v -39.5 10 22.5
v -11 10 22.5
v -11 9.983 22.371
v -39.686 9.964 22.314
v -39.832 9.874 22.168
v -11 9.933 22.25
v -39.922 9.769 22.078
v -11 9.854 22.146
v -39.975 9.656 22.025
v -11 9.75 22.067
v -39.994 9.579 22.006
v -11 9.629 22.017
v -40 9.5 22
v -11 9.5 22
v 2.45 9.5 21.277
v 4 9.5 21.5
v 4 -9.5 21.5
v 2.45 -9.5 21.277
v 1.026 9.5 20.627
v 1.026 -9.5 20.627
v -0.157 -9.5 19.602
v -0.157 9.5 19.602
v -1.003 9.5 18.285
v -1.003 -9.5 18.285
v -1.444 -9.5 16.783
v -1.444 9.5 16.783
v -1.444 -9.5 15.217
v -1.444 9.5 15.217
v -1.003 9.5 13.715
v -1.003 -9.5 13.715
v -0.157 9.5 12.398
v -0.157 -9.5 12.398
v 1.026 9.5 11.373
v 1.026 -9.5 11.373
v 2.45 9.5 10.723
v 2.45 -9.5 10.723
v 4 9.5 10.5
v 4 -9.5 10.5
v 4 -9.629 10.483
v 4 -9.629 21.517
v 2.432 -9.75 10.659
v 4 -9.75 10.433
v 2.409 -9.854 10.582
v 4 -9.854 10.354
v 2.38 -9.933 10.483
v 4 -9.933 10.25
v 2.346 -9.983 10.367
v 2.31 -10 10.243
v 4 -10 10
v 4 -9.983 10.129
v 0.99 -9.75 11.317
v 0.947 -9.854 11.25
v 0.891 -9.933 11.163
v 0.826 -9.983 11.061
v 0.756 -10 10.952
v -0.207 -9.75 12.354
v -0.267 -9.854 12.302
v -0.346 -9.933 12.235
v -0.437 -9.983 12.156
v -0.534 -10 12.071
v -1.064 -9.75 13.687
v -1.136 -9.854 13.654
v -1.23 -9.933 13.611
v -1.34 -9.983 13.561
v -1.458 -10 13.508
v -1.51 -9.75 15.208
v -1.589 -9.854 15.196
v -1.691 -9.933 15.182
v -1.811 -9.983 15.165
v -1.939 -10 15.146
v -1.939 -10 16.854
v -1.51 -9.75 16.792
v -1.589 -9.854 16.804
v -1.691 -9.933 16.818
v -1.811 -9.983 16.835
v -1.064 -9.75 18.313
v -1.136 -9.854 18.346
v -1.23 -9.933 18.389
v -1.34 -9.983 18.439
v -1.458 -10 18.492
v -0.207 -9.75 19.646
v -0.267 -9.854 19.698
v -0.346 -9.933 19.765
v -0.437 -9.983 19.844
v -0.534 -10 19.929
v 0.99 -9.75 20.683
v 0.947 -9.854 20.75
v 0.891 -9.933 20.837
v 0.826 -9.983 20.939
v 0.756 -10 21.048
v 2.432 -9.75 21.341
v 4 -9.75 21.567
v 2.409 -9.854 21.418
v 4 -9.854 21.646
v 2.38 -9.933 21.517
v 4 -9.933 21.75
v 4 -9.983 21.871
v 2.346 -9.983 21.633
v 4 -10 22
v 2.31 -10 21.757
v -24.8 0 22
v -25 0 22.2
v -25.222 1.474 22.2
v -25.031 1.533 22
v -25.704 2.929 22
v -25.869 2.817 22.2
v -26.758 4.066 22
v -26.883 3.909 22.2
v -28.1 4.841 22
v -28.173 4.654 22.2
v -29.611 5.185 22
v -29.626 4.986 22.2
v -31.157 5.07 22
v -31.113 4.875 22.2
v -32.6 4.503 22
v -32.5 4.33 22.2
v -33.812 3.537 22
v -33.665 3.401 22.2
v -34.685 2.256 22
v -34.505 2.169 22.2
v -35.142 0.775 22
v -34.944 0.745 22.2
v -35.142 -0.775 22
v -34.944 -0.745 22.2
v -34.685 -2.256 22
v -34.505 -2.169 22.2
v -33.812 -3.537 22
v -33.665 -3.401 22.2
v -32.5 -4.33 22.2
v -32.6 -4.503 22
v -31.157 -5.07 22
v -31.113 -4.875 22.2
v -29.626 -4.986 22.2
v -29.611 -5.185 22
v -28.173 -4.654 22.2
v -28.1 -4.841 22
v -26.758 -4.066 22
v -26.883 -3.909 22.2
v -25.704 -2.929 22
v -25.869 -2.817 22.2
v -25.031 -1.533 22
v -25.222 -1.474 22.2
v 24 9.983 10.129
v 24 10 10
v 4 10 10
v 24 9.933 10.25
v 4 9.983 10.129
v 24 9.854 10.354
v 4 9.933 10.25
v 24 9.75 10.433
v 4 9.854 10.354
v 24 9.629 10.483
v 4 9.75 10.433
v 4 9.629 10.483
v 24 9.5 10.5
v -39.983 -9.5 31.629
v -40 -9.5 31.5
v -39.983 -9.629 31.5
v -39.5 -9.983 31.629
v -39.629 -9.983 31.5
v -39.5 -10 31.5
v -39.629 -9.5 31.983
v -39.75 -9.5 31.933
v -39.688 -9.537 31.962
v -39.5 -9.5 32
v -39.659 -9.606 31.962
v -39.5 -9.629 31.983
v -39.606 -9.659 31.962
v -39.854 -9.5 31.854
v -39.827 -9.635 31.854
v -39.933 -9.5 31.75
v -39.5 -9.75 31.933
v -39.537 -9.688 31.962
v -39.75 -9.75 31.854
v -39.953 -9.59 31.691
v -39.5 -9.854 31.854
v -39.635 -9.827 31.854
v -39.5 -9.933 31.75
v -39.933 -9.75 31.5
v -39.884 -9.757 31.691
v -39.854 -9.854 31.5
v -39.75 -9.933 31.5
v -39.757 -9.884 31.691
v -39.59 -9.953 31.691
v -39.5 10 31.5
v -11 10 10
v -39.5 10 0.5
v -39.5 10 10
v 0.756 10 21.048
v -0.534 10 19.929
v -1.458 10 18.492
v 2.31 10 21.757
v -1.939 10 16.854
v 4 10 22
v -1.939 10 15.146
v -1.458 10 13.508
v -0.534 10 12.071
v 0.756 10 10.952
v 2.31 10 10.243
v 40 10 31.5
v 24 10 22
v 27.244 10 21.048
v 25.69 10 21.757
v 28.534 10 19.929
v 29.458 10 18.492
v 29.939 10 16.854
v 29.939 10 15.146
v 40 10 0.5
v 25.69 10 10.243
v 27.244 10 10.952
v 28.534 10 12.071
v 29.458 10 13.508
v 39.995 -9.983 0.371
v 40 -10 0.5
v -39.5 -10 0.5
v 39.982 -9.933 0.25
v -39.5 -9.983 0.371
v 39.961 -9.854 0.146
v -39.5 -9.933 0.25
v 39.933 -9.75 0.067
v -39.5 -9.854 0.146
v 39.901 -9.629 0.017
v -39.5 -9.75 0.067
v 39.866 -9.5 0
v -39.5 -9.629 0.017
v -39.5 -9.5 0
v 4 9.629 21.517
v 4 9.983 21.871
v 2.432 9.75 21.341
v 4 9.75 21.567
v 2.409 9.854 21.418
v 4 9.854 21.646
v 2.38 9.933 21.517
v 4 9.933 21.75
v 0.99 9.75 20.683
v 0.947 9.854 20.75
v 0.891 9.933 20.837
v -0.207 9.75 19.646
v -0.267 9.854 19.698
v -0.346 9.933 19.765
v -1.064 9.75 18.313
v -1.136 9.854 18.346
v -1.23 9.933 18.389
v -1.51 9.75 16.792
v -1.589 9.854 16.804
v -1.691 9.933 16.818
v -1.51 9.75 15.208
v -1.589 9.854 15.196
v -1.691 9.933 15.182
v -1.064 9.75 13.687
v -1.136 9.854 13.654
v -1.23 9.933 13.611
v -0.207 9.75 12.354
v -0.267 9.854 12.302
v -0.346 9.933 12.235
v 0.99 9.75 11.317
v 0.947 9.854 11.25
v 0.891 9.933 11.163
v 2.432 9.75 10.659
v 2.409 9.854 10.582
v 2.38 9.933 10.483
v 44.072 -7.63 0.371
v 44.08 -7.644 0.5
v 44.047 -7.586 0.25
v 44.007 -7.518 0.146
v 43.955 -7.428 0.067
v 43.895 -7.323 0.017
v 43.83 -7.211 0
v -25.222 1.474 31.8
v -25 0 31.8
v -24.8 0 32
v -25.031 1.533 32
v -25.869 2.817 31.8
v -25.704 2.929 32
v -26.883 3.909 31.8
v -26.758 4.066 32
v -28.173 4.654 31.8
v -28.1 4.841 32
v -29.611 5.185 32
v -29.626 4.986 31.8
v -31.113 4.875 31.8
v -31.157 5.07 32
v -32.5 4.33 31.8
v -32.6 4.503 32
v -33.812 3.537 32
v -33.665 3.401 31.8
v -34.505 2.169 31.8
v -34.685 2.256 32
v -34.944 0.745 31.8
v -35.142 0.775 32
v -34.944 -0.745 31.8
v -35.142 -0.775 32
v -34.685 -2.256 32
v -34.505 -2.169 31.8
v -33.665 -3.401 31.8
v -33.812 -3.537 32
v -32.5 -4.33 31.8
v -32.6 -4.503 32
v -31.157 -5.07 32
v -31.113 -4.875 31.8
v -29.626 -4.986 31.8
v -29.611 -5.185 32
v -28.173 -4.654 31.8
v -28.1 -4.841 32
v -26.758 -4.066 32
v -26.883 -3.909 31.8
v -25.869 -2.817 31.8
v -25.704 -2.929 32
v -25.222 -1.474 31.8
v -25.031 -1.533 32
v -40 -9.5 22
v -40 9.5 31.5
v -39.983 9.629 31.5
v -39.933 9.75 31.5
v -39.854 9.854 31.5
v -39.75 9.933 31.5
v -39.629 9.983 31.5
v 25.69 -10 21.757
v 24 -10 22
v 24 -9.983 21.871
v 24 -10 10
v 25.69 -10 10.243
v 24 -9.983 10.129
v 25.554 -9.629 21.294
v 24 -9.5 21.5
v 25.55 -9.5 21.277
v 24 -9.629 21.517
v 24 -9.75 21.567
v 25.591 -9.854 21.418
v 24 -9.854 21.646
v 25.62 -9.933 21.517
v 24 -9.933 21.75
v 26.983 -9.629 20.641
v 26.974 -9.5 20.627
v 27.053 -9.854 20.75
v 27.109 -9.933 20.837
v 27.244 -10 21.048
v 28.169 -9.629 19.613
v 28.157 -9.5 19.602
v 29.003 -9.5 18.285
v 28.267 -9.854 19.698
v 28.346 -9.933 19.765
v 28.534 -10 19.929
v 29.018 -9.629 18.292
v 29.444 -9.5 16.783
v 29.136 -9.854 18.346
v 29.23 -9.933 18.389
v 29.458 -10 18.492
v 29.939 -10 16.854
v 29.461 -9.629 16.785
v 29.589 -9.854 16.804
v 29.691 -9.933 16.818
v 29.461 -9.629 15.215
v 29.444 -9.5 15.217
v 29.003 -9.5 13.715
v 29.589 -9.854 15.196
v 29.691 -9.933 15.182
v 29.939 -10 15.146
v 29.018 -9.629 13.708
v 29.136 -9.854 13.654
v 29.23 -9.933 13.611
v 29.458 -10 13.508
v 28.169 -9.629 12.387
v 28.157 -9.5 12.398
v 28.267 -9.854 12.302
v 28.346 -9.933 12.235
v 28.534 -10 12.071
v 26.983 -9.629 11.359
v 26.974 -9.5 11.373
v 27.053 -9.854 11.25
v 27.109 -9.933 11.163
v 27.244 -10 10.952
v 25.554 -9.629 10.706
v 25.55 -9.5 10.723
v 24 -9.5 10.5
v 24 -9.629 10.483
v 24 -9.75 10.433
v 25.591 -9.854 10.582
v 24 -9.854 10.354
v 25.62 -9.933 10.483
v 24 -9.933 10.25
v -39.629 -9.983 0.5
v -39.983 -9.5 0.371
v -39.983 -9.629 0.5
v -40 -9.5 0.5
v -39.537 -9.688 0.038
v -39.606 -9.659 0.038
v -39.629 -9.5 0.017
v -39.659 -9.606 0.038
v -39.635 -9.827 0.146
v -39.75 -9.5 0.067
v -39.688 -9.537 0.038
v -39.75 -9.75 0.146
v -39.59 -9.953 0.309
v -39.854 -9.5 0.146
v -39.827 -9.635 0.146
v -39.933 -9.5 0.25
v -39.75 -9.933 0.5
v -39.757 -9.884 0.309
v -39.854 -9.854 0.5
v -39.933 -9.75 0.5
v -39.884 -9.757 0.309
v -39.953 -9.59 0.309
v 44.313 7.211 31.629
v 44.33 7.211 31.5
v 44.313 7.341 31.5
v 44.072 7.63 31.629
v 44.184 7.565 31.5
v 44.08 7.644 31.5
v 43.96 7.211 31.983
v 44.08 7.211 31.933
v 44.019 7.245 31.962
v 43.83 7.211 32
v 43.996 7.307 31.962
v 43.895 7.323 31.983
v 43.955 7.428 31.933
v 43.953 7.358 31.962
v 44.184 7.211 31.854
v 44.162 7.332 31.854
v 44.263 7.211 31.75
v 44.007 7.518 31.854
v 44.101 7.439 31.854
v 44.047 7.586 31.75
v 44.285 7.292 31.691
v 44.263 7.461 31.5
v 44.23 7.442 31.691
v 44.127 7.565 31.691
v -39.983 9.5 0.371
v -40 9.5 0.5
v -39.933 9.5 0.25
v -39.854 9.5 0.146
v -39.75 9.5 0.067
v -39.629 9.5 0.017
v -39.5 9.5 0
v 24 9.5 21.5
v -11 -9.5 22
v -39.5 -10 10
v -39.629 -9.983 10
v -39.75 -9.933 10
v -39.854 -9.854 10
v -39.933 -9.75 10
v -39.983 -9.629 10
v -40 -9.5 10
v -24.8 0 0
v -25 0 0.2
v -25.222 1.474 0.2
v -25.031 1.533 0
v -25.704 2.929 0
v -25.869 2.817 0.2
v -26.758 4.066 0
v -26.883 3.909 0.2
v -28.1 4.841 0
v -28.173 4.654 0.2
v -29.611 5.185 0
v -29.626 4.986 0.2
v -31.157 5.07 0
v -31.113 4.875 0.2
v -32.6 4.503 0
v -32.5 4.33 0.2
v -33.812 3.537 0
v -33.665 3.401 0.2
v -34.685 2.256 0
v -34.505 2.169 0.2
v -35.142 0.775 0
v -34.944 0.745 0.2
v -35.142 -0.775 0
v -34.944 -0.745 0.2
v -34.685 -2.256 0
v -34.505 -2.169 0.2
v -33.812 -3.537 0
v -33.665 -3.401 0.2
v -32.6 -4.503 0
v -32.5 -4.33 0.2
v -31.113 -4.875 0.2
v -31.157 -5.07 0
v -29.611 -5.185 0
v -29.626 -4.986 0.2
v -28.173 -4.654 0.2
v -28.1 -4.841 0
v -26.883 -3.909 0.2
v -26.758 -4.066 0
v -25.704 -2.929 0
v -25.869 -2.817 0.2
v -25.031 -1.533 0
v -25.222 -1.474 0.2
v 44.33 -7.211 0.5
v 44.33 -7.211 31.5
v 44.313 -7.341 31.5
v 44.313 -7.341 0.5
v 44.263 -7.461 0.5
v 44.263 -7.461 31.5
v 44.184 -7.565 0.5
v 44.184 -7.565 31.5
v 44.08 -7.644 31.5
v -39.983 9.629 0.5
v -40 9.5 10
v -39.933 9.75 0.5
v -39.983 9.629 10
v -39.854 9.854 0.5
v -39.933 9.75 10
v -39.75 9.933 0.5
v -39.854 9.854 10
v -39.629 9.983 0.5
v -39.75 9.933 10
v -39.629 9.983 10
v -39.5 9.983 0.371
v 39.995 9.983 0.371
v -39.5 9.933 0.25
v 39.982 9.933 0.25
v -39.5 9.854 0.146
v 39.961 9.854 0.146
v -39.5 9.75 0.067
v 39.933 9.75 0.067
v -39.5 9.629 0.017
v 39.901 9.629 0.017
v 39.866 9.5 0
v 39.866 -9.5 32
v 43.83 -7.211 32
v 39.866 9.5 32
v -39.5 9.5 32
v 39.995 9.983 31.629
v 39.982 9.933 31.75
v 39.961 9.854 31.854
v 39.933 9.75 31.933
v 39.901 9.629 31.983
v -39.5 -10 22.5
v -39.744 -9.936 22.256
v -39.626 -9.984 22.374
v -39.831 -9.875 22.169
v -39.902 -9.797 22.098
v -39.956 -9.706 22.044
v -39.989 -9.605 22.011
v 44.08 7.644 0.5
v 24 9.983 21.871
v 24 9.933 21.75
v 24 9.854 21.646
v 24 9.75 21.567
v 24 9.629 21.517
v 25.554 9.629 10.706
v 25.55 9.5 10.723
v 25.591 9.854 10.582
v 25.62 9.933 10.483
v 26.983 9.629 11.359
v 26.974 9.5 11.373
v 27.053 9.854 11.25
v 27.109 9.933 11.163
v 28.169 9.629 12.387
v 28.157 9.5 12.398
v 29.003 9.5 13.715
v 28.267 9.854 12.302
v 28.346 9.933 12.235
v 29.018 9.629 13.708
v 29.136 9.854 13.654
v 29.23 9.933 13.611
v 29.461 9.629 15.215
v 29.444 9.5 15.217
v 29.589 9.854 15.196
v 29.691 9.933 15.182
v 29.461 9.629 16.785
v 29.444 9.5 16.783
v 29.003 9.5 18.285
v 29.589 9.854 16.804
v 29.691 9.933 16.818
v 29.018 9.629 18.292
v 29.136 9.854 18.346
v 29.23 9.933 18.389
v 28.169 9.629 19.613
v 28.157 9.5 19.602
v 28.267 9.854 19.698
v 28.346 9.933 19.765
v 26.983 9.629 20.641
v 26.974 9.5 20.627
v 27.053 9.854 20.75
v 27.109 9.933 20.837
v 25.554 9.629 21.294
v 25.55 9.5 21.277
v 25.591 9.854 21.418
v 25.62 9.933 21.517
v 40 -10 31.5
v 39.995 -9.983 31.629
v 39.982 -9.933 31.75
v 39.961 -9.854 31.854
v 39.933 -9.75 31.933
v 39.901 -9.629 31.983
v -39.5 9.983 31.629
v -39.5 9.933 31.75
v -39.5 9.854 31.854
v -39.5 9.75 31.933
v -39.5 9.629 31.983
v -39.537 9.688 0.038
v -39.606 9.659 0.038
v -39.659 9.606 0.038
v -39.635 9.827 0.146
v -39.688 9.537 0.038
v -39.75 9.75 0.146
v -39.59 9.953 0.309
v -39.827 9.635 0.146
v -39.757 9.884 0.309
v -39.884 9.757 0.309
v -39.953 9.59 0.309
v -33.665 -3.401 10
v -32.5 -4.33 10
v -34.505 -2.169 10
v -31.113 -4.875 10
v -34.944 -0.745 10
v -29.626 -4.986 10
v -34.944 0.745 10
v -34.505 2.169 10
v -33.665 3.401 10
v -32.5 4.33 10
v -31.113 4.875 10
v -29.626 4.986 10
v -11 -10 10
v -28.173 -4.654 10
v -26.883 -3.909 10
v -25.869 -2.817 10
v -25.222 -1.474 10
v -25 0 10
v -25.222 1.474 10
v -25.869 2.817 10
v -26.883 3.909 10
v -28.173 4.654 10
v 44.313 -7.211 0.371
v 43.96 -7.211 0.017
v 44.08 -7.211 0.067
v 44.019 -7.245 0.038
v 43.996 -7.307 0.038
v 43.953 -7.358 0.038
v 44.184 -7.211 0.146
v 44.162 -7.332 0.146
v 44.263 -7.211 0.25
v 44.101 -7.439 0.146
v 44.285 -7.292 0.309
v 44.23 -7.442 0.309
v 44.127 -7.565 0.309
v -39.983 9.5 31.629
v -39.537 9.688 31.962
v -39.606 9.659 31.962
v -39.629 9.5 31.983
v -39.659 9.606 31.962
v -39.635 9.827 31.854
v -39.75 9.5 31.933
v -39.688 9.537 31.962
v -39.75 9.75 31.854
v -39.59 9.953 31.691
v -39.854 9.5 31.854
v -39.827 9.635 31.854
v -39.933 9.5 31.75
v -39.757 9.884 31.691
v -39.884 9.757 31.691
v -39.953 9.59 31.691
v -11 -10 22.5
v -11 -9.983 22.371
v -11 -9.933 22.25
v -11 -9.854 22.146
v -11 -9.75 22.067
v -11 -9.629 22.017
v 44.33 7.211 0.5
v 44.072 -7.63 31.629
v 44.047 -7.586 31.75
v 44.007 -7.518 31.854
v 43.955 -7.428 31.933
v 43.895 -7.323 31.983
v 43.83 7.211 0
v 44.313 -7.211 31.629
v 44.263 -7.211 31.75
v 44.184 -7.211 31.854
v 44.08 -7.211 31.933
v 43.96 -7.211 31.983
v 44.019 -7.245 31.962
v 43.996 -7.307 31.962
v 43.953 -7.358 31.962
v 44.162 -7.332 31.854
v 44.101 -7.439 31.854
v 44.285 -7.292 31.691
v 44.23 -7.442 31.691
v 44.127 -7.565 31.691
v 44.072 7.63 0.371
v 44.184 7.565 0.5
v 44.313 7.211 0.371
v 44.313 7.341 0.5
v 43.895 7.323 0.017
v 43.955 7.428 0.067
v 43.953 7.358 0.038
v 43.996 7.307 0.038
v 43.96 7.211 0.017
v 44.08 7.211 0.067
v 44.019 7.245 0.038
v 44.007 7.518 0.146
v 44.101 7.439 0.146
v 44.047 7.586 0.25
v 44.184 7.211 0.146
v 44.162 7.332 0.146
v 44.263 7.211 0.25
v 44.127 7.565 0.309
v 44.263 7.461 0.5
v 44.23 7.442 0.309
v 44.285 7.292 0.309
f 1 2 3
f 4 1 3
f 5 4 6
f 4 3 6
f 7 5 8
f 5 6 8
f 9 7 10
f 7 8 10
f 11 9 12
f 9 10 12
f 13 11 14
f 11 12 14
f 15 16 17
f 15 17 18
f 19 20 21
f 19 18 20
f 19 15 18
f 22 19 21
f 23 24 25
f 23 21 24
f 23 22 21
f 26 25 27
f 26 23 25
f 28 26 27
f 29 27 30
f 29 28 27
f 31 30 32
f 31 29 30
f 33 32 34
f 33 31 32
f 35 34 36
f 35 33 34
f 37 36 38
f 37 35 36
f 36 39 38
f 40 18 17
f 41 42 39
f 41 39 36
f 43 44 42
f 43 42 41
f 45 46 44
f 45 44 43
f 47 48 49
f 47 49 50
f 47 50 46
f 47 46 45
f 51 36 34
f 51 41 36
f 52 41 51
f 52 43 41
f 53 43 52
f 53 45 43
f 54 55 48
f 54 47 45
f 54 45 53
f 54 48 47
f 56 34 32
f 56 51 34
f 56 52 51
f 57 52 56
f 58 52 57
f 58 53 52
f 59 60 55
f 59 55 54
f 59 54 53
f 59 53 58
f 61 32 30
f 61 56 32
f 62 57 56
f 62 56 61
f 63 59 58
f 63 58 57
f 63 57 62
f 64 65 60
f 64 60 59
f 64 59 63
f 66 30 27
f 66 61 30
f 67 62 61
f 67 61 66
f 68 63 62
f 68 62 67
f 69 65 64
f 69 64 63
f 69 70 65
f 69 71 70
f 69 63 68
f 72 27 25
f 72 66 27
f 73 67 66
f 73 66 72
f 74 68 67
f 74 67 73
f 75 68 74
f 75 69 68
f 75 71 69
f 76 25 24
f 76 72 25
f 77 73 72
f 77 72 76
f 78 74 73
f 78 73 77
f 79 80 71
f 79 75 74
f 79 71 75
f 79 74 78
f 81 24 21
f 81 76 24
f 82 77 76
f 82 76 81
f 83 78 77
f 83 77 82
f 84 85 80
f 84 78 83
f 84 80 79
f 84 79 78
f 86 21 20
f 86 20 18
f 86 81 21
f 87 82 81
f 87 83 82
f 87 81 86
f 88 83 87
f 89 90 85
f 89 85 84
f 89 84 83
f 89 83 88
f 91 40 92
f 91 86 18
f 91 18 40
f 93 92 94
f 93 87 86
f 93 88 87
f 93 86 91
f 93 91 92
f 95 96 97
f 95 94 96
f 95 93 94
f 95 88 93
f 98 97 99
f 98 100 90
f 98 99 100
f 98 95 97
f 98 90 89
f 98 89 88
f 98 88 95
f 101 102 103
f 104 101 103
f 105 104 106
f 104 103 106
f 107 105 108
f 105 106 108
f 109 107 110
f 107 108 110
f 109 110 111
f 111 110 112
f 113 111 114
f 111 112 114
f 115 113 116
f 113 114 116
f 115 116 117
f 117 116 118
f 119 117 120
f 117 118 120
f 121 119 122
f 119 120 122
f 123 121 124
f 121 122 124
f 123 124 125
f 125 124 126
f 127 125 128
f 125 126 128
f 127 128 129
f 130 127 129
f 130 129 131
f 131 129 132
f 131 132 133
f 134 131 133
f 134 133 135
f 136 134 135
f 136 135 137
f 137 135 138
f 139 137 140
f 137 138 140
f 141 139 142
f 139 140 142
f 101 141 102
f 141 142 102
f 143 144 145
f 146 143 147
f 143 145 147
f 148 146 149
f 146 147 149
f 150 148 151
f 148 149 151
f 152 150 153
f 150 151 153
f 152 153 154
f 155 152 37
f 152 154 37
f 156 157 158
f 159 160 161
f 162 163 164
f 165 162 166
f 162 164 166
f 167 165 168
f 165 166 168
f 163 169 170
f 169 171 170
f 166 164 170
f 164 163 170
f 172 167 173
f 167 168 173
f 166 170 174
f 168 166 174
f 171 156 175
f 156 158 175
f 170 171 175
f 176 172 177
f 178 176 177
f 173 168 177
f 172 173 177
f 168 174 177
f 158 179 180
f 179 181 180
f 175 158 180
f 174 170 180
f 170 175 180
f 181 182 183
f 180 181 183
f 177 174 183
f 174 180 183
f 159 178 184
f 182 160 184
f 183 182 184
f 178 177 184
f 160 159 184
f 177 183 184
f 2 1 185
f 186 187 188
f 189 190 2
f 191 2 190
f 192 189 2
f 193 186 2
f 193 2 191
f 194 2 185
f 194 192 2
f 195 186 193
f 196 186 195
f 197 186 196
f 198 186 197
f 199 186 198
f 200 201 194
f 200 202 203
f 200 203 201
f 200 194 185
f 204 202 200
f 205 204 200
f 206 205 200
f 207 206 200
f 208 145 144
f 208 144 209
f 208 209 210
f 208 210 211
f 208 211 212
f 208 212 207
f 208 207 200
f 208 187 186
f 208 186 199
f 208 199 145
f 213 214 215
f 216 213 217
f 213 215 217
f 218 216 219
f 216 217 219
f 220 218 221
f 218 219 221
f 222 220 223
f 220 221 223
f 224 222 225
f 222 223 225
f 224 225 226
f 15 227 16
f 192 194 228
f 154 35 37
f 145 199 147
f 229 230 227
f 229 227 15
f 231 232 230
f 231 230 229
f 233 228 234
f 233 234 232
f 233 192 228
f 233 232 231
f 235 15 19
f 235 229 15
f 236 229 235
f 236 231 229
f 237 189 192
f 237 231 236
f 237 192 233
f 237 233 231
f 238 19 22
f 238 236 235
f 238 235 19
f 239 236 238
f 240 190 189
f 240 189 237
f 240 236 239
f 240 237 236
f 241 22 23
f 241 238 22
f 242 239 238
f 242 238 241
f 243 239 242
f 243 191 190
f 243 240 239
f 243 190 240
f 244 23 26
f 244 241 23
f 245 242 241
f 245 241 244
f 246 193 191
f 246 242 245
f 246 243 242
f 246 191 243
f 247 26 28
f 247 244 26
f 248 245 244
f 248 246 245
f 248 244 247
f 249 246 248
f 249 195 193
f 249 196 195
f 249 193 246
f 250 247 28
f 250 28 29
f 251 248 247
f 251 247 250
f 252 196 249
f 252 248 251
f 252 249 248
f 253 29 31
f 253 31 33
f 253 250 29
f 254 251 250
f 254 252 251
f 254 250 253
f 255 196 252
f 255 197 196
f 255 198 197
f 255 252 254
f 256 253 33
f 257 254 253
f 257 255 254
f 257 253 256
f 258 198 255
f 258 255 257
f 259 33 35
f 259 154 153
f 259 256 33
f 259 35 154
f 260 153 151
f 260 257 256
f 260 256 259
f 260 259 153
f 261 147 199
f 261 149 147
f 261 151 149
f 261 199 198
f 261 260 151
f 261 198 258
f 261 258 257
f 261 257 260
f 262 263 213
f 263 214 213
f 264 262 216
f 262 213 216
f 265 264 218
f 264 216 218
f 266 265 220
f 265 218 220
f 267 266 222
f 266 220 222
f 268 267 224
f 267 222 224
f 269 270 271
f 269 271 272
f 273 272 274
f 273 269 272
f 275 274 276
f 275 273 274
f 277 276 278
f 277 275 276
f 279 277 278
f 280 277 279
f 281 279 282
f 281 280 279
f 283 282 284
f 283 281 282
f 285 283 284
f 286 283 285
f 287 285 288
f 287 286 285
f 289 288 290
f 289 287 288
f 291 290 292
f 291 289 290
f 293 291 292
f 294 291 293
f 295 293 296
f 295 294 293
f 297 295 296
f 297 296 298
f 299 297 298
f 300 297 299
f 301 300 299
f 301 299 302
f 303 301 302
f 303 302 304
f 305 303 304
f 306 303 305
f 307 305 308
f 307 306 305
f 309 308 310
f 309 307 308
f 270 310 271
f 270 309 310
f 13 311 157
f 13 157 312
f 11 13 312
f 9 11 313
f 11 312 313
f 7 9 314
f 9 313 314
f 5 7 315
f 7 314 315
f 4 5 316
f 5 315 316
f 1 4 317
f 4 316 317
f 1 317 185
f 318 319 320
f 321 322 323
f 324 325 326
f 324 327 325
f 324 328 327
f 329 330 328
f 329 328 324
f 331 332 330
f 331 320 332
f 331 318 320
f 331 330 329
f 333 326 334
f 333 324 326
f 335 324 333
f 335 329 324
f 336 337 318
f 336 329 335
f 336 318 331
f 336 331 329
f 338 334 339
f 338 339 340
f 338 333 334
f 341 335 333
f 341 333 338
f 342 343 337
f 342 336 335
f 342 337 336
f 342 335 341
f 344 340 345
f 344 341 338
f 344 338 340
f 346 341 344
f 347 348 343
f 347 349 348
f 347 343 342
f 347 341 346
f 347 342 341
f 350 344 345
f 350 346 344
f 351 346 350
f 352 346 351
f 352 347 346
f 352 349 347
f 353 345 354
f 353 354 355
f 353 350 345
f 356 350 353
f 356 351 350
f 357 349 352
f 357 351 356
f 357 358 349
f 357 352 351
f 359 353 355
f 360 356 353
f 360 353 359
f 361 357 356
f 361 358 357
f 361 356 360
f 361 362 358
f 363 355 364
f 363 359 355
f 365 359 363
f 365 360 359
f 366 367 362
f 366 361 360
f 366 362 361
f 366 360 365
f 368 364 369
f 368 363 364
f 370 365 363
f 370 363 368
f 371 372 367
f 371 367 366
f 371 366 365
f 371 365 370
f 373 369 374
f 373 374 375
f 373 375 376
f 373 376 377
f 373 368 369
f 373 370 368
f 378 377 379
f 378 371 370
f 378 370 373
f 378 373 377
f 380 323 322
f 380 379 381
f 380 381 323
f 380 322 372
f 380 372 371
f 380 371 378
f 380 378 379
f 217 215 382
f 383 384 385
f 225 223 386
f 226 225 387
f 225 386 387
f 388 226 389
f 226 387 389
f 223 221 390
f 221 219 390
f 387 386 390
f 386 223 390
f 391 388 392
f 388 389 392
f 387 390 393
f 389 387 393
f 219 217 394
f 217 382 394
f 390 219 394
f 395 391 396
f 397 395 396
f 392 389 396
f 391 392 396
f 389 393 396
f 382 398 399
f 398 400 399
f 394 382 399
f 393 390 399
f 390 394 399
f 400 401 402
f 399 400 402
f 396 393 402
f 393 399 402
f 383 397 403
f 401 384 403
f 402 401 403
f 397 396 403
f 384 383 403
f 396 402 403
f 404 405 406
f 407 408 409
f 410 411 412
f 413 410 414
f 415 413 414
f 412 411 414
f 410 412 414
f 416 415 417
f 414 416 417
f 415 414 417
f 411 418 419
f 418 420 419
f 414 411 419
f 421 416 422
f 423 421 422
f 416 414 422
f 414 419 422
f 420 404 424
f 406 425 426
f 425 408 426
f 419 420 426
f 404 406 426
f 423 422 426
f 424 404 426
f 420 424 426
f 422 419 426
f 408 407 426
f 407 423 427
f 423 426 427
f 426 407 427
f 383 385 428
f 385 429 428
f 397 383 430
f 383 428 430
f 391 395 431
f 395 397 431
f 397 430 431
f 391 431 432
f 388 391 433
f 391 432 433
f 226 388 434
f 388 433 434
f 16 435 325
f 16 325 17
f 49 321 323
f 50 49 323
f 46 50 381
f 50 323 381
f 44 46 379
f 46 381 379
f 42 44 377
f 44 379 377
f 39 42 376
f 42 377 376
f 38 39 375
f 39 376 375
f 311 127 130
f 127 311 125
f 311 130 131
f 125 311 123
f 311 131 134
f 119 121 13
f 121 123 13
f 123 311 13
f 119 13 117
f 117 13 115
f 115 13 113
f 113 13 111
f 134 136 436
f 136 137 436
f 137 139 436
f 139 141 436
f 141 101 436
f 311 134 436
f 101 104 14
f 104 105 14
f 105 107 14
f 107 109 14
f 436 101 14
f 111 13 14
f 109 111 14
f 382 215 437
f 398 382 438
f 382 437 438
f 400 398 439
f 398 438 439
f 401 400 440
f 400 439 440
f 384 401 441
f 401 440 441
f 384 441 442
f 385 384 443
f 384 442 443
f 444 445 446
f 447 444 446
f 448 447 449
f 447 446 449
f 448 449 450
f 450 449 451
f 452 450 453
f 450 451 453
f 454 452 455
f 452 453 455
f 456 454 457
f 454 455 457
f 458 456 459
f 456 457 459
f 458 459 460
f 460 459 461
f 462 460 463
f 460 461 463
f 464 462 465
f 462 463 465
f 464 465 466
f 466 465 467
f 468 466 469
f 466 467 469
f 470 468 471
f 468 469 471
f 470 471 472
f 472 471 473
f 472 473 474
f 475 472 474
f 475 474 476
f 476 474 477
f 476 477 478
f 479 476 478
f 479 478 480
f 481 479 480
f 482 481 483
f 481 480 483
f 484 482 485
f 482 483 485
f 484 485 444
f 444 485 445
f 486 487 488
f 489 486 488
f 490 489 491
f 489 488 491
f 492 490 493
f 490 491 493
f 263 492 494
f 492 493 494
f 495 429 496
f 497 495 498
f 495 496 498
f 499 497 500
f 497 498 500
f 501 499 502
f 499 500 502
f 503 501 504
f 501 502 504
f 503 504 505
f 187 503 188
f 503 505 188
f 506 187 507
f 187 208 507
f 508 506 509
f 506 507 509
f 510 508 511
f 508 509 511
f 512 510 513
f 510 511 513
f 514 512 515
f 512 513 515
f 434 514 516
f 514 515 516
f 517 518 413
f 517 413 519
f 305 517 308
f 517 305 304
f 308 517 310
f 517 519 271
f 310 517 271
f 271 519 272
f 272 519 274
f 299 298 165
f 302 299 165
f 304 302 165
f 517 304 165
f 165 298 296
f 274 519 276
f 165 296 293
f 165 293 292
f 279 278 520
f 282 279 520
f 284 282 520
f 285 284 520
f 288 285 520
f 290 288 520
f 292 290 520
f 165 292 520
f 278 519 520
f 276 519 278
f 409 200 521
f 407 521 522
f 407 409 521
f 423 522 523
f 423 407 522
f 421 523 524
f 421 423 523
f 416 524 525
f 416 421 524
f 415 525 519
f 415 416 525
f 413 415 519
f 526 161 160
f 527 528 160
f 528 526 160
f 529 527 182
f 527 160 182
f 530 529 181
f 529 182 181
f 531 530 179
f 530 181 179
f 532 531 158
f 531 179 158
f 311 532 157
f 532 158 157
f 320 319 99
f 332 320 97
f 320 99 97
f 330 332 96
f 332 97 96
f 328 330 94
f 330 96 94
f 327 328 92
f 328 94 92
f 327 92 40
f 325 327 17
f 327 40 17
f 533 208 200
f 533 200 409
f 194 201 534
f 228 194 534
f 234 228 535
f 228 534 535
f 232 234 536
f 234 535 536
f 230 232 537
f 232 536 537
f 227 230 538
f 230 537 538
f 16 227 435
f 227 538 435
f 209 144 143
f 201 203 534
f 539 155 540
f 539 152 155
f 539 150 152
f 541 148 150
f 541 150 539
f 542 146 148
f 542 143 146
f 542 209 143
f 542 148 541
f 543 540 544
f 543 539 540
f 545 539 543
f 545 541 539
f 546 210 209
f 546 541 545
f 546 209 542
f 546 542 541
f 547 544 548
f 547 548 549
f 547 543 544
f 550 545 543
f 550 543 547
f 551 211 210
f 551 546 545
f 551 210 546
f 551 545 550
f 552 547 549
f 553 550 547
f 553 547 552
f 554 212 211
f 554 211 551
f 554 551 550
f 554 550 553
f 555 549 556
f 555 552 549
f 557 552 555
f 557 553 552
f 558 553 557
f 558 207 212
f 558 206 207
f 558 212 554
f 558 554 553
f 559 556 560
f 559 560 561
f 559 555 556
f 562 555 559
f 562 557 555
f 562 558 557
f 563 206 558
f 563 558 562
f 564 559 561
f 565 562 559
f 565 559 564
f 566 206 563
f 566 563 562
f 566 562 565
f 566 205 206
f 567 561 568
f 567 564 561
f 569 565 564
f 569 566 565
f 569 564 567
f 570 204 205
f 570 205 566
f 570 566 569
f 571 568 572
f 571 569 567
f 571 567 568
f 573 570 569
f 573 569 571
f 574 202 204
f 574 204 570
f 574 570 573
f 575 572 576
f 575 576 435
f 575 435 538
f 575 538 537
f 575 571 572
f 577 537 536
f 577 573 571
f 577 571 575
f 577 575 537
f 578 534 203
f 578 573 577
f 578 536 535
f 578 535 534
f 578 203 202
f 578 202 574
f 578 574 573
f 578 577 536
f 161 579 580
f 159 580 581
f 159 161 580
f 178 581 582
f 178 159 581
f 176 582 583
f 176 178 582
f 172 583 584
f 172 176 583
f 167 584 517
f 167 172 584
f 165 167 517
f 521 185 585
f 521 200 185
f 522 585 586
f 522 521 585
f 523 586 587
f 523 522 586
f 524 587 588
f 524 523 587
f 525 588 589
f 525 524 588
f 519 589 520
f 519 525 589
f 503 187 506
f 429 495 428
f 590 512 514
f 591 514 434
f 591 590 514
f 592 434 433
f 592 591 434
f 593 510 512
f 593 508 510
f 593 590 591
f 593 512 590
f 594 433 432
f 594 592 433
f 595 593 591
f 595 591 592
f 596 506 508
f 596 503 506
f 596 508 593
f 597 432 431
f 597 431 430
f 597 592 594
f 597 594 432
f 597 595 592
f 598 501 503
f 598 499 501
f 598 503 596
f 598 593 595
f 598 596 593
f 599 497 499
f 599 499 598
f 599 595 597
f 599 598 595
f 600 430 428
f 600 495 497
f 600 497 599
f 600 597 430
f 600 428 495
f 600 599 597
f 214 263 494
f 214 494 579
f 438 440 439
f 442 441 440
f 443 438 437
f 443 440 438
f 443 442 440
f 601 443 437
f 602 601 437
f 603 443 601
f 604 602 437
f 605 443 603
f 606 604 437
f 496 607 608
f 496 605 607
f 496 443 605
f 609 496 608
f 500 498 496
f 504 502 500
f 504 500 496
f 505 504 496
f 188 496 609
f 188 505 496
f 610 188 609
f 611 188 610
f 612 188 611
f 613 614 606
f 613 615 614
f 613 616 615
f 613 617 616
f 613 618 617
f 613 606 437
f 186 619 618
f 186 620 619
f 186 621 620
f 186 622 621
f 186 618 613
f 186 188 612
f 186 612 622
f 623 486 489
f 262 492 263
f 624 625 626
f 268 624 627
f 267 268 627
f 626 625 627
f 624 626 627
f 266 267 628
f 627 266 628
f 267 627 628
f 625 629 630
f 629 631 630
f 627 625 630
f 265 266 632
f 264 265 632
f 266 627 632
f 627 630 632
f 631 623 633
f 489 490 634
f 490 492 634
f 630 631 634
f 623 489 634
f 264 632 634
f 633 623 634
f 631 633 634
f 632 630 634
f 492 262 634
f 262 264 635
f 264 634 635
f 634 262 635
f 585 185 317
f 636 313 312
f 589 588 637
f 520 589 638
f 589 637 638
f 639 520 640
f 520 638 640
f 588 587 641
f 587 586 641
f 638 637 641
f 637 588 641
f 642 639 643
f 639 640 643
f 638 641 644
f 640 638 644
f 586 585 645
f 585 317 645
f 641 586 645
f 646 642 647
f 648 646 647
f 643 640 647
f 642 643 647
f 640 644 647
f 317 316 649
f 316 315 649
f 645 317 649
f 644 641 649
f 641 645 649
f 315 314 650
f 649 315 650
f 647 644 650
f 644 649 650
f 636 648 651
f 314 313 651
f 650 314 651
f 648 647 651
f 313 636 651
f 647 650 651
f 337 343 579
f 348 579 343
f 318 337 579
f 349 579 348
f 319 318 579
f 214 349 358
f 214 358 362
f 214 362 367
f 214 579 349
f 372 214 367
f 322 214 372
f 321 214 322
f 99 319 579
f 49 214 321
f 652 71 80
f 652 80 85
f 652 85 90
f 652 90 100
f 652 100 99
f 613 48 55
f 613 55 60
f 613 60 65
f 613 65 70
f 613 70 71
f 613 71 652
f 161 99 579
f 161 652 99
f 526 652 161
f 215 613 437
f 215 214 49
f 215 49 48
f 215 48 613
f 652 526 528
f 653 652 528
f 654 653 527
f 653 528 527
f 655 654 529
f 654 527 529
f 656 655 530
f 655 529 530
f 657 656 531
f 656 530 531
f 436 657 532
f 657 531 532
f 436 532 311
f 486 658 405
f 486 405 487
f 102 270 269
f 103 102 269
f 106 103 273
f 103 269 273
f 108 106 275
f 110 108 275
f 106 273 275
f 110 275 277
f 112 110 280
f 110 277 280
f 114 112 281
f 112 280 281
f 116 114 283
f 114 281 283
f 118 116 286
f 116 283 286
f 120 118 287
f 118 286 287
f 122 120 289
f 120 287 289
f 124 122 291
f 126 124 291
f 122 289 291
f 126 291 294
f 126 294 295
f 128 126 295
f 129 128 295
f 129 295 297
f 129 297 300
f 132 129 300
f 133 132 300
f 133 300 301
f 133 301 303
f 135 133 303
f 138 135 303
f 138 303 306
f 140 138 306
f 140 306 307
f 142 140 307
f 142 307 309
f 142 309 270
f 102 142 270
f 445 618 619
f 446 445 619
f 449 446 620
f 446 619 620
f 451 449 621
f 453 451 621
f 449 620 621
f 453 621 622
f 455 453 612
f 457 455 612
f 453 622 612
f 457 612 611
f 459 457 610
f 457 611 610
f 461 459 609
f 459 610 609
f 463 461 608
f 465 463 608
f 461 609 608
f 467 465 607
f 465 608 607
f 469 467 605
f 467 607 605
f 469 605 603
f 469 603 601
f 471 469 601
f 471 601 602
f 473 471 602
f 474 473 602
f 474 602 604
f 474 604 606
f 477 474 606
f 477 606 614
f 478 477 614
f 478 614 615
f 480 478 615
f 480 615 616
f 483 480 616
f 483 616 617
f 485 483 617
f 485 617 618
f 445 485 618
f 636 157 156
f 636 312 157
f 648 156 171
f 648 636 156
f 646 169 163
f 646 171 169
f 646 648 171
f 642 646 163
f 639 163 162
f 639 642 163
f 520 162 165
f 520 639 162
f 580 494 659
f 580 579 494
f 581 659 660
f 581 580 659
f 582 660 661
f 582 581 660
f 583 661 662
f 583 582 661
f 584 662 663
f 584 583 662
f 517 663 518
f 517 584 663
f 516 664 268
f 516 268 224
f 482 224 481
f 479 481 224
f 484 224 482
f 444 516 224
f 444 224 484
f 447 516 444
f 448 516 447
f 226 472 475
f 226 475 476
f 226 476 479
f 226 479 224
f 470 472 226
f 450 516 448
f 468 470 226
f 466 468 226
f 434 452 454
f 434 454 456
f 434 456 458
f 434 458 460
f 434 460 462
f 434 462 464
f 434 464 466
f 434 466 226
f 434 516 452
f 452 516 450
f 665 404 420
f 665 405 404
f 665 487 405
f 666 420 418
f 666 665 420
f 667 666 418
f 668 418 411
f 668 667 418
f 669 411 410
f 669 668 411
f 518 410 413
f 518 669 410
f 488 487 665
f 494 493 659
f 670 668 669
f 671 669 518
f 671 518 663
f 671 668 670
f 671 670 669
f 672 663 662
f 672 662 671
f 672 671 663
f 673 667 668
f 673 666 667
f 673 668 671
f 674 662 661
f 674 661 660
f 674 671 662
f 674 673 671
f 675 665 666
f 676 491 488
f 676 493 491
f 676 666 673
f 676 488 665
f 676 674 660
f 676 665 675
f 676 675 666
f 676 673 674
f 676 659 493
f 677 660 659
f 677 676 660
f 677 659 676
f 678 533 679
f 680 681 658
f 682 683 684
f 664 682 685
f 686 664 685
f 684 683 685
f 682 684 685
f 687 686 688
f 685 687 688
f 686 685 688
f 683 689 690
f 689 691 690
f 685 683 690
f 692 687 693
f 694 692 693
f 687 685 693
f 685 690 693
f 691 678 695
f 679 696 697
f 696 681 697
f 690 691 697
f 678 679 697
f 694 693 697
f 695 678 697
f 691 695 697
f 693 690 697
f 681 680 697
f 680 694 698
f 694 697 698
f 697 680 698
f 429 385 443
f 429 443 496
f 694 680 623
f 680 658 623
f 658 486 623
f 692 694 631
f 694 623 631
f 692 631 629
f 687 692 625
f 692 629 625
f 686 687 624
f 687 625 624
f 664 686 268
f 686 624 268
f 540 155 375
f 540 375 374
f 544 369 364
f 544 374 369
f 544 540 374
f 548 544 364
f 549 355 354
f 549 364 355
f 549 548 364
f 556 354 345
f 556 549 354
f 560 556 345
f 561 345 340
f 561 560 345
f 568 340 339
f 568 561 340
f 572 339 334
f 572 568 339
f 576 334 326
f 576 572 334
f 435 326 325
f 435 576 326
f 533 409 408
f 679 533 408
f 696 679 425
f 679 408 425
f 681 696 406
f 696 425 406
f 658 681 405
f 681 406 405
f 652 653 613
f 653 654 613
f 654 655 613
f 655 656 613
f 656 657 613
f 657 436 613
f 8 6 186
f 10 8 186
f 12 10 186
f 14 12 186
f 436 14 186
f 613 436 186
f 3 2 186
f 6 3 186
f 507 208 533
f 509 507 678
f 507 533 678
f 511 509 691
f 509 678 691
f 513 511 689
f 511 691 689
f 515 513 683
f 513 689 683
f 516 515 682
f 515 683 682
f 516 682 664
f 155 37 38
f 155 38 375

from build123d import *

# Parameters (mm, degrees)
BASE_BRIDE_DEPTH          = 32
CONG_BRIDE1_R             = 0.5
ESQUISSE_ENL_V_MAT_BRID_W = 29
ESQUISSE_ENL_V_MAT_BRID_H = 12
ENL_V_MATI_RE_BRIDE_DEPTH = 59.216493896
CONG_BRIDE2_R             = 0.5
ESQUISSE_PERCAGE_BRIDE_R  = 5
PERCAGE_BRIDE_DEPTH       = 56.580213759
CHANFREIN_BRIDE_SIZE      = 0.2


with BuildPart() as part:
    # esquisse_base_bride → Base_bride (new body)
    with BuildSketch(Plane.XY):
        Polygon((40, 10), (44.330127019, 7.5), (44.330127019, -7.5), (40, -10), (-40, -10), (-40, 10), align=None)
    extrude(amount=BASE_BRIDE_DEPTH)

    # congé_bride1
    cong_bride1_edges = [part.edges().sort_by_distance(p)[0] for p in [
        (42.165063509, -8.75, 32),
        (-40, 10, 16),
        (44.330127019, 7.5, 16),
        (44.330127019, -7.5, 16),
        (-40, -10, 16),
        (44.330127019, 0, 32),
        (42.165063509, 8.75, 32),
        (0, 10, 32),
        (-40, 0, 32),
        (0, 10, 0),
        (42.165063509, 8.75, 0),
        (44.330127019, 0, 0),
        (0, -10, 32),
        (42.165063509, -8.75, 0),
        (0, -10, 0),
        (-40, 0, 0),
    ]]
    fillet(cong_bride1_edges, radius=CONG_BRIDE1_R)

    # esquisse_enlèv.mat.brid → enlèv.matière_bride (cut, through all)
    with BuildSketch(Plane(origin=(0, 10, 0), x_dir=(1, 0, 0), z_dir=(0, 1, 0))):
        with Locations((-25.5, -16)):
            Rectangle(ESQUISSE_ENL_V_MAT_BRID_W, ESQUISSE_ENL_V_MAT_BRID_H)
        with BuildLine():
            Line((4, -10.5), (24, -10.5))
            ThreePointArc((24, -10.5), (29.5, -16), (24, -21.5))
            Line((24, -21.5), (4, -21.5))
            ThreePointArc((4, -21.5), (-1.5, -16), (4, -10.5))
        make_face()
    extrude(amount=-ENL_V_MATI_RE_BRIDE_DEPTH, mode=Mode.SUBTRACT)

    # congé_bride2
    # the kernel refuses this fillet: 0.5 mm, written as the material it takes off along each edge
    with BuildSketch(Plane(origin=(-40.75, -10, 22), x_dir=(0, 1, 0), z_dir=(1, 0, 0))) as cong_bride2_piece_1:
        with BuildLine():
            CenterArc((CONG_BRIDE2_R, CONG_BRIDE2_R), CONG_BRIDE2_R, 180, 90)
            Line((0, CONG_BRIDE2_R), (0, 0))
            Line((0, 0), (CONG_BRIDE2_R, 0))
        make_face()
    extrude(amount=29.75, mode=Mode.SUBTRACT)
    with BuildSketch(Plane(origin=(-11, 10, 22), x_dir=(0, 0, 1), z_dir=(-1, 0, 0))) as cong_bride2_piece_2:
        with BuildLine():
            CenterArc((CONG_BRIDE2_R, -CONG_BRIDE2_R), CONG_BRIDE2_R, 90, 90)
            Line((0, -CONG_BRIDE2_R), (0, 0))
            Line((0, 0), (CONG_BRIDE2_R, 0))
        make_face()
    extrude(amount=29.75, mode=Mode.SUBTRACT)
    with BuildSketch(Plane(origin=(24, 10, 16), x_dir=(0, 0, -1), z_dir=(-1, 0, 0))) as cong_bride2_piece_3:
        with BuildLine():
            CenterArc((5.5 + CONG_BRIDE2_R, CONG_BRIDE2_R), CONG_BRIDE2_R, 180, 90)
            Line((5.5, CONG_BRIDE2_R), (5.5, 0))
            Line((5.5, 0), (5.5 + CONG_BRIDE2_R, 0))
        make_face()
    revolve(axis=Axis((24, 10, 16), (0, -1, 0)), revolution_arc=180, mode=Mode.SUBTRACT)
    with BuildSketch(Plane(origin=(4, 10, 10.5), x_dir=(0, 0, -1), z_dir=(1, 0, 0)), Plane(origin=(24, 10, 21.5), x_dir=(0, 0, 1), z_dir=(-1, 0, 0))) as cong_bride2_piece_4:
        with BuildLine():
            CenterArc((CONG_BRIDE2_R, -CONG_BRIDE2_R), CONG_BRIDE2_R, 90, 90)
            Line((0, -CONG_BRIDE2_R), (0, 0))
            Line((0, 0), (CONG_BRIDE2_R, 0))
        make_face()
    extrude(amount=20, mode=Mode.SUBTRACT)
    with BuildSketch(Plane(origin=(4, 10, 16), x_dir=(0, 0, 1), z_dir=(1, 0, 0))) as cong_bride2_piece_5:
        with BuildLine():
            CenterArc((5.5 + CONG_BRIDE2_R, CONG_BRIDE2_R), CONG_BRIDE2_R, 180, 90)
            Line((5.5, CONG_BRIDE2_R), (5.5, 0))
            Line((5.5, 0), (5.5 + CONG_BRIDE2_R, 0))
        make_face()
    revolve(axis=Axis((4, 10, 16), (0, -1, 0)), revolution_arc=180, mode=Mode.SUBTRACT)
    with BuildSketch(Plane(origin=(24, -10, 16), x_dir=(0, 0, 1), z_dir=(-1, 0, 0))) as cong_bride2_piece_6:
        with BuildLine():
            CenterArc((5.5 + CONG_BRIDE2_R, CONG_BRIDE2_R), CONG_BRIDE2_R, 180, 90)
            Line((5.5 + CONG_BRIDE2_R, 0), (5.5, 0))
            Line((5.5, 0), (5.5, CONG_BRIDE2_R))
        make_face()
    revolve(axis=Axis((24, -10, 16), (0, 1, 0)), revolution_arc=180, mode=Mode.SUBTRACT)
    with BuildSketch(Plane(origin=(24, -10, 10.5), x_dir=(0, 1, 0), z_dir=(-1, 0, 0)), Plane(origin=(4, -10, 21.5), x_dir=(0, 1, 0), z_dir=(1, 0, 0))) as cong_bride2_piece_7:
        with BuildLine():
            CenterArc((CONG_BRIDE2_R, CONG_BRIDE2_R), CONG_BRIDE2_R, 180, 90)
            Line((0, CONG_BRIDE2_R), (0, 0))
            Line((0, 0), (CONG_BRIDE2_R, 0))
        make_face()
    extrude(amount=20, mode=Mode.SUBTRACT)
    with BuildSketch(Plane(origin=(4, -10, 16), x_dir=(0, 0, -1), z_dir=(1, 0, 0))) as cong_bride2_piece_8:
        with BuildLine():
            CenterArc((5.5 + CONG_BRIDE2_R, CONG_BRIDE2_R), CONG_BRIDE2_R, 180, 90)
            Line((5.5 + CONG_BRIDE2_R, 0), (5.5, 0))
            Line((5.5, 0), (5.5, CONG_BRIDE2_R))
        make_face()
    revolve(axis=Axis((4, -10, 16), (0, 1, 0)), revolution_arc=180, mode=Mode.SUBTRACT)

    # esquisse_percage_bride → percage_bride (cut, through all)
    with BuildSketch(Plane.XY.offset(32)):
        with Locations((-30, 0)):
            Circle(ESQUISSE_PERCAGE_BRIDE_R)
    extrude(amount=-PERCAGE_BRIDE_DEPTH, mode=Mode.SUBTRACT)

    # chanfrein_bride
    chanfrein_bride_edges = [part.edges().sort_by_distance(p)[0] for p in [
        (-35, 0, 0),
        (-35, 0, 22),
        (-35, 0, 32),
    ]]
    chamfer(chanfrein_bride_edges, length=CHANFREIN_BRIDE_SIZE)


solid = part.part
